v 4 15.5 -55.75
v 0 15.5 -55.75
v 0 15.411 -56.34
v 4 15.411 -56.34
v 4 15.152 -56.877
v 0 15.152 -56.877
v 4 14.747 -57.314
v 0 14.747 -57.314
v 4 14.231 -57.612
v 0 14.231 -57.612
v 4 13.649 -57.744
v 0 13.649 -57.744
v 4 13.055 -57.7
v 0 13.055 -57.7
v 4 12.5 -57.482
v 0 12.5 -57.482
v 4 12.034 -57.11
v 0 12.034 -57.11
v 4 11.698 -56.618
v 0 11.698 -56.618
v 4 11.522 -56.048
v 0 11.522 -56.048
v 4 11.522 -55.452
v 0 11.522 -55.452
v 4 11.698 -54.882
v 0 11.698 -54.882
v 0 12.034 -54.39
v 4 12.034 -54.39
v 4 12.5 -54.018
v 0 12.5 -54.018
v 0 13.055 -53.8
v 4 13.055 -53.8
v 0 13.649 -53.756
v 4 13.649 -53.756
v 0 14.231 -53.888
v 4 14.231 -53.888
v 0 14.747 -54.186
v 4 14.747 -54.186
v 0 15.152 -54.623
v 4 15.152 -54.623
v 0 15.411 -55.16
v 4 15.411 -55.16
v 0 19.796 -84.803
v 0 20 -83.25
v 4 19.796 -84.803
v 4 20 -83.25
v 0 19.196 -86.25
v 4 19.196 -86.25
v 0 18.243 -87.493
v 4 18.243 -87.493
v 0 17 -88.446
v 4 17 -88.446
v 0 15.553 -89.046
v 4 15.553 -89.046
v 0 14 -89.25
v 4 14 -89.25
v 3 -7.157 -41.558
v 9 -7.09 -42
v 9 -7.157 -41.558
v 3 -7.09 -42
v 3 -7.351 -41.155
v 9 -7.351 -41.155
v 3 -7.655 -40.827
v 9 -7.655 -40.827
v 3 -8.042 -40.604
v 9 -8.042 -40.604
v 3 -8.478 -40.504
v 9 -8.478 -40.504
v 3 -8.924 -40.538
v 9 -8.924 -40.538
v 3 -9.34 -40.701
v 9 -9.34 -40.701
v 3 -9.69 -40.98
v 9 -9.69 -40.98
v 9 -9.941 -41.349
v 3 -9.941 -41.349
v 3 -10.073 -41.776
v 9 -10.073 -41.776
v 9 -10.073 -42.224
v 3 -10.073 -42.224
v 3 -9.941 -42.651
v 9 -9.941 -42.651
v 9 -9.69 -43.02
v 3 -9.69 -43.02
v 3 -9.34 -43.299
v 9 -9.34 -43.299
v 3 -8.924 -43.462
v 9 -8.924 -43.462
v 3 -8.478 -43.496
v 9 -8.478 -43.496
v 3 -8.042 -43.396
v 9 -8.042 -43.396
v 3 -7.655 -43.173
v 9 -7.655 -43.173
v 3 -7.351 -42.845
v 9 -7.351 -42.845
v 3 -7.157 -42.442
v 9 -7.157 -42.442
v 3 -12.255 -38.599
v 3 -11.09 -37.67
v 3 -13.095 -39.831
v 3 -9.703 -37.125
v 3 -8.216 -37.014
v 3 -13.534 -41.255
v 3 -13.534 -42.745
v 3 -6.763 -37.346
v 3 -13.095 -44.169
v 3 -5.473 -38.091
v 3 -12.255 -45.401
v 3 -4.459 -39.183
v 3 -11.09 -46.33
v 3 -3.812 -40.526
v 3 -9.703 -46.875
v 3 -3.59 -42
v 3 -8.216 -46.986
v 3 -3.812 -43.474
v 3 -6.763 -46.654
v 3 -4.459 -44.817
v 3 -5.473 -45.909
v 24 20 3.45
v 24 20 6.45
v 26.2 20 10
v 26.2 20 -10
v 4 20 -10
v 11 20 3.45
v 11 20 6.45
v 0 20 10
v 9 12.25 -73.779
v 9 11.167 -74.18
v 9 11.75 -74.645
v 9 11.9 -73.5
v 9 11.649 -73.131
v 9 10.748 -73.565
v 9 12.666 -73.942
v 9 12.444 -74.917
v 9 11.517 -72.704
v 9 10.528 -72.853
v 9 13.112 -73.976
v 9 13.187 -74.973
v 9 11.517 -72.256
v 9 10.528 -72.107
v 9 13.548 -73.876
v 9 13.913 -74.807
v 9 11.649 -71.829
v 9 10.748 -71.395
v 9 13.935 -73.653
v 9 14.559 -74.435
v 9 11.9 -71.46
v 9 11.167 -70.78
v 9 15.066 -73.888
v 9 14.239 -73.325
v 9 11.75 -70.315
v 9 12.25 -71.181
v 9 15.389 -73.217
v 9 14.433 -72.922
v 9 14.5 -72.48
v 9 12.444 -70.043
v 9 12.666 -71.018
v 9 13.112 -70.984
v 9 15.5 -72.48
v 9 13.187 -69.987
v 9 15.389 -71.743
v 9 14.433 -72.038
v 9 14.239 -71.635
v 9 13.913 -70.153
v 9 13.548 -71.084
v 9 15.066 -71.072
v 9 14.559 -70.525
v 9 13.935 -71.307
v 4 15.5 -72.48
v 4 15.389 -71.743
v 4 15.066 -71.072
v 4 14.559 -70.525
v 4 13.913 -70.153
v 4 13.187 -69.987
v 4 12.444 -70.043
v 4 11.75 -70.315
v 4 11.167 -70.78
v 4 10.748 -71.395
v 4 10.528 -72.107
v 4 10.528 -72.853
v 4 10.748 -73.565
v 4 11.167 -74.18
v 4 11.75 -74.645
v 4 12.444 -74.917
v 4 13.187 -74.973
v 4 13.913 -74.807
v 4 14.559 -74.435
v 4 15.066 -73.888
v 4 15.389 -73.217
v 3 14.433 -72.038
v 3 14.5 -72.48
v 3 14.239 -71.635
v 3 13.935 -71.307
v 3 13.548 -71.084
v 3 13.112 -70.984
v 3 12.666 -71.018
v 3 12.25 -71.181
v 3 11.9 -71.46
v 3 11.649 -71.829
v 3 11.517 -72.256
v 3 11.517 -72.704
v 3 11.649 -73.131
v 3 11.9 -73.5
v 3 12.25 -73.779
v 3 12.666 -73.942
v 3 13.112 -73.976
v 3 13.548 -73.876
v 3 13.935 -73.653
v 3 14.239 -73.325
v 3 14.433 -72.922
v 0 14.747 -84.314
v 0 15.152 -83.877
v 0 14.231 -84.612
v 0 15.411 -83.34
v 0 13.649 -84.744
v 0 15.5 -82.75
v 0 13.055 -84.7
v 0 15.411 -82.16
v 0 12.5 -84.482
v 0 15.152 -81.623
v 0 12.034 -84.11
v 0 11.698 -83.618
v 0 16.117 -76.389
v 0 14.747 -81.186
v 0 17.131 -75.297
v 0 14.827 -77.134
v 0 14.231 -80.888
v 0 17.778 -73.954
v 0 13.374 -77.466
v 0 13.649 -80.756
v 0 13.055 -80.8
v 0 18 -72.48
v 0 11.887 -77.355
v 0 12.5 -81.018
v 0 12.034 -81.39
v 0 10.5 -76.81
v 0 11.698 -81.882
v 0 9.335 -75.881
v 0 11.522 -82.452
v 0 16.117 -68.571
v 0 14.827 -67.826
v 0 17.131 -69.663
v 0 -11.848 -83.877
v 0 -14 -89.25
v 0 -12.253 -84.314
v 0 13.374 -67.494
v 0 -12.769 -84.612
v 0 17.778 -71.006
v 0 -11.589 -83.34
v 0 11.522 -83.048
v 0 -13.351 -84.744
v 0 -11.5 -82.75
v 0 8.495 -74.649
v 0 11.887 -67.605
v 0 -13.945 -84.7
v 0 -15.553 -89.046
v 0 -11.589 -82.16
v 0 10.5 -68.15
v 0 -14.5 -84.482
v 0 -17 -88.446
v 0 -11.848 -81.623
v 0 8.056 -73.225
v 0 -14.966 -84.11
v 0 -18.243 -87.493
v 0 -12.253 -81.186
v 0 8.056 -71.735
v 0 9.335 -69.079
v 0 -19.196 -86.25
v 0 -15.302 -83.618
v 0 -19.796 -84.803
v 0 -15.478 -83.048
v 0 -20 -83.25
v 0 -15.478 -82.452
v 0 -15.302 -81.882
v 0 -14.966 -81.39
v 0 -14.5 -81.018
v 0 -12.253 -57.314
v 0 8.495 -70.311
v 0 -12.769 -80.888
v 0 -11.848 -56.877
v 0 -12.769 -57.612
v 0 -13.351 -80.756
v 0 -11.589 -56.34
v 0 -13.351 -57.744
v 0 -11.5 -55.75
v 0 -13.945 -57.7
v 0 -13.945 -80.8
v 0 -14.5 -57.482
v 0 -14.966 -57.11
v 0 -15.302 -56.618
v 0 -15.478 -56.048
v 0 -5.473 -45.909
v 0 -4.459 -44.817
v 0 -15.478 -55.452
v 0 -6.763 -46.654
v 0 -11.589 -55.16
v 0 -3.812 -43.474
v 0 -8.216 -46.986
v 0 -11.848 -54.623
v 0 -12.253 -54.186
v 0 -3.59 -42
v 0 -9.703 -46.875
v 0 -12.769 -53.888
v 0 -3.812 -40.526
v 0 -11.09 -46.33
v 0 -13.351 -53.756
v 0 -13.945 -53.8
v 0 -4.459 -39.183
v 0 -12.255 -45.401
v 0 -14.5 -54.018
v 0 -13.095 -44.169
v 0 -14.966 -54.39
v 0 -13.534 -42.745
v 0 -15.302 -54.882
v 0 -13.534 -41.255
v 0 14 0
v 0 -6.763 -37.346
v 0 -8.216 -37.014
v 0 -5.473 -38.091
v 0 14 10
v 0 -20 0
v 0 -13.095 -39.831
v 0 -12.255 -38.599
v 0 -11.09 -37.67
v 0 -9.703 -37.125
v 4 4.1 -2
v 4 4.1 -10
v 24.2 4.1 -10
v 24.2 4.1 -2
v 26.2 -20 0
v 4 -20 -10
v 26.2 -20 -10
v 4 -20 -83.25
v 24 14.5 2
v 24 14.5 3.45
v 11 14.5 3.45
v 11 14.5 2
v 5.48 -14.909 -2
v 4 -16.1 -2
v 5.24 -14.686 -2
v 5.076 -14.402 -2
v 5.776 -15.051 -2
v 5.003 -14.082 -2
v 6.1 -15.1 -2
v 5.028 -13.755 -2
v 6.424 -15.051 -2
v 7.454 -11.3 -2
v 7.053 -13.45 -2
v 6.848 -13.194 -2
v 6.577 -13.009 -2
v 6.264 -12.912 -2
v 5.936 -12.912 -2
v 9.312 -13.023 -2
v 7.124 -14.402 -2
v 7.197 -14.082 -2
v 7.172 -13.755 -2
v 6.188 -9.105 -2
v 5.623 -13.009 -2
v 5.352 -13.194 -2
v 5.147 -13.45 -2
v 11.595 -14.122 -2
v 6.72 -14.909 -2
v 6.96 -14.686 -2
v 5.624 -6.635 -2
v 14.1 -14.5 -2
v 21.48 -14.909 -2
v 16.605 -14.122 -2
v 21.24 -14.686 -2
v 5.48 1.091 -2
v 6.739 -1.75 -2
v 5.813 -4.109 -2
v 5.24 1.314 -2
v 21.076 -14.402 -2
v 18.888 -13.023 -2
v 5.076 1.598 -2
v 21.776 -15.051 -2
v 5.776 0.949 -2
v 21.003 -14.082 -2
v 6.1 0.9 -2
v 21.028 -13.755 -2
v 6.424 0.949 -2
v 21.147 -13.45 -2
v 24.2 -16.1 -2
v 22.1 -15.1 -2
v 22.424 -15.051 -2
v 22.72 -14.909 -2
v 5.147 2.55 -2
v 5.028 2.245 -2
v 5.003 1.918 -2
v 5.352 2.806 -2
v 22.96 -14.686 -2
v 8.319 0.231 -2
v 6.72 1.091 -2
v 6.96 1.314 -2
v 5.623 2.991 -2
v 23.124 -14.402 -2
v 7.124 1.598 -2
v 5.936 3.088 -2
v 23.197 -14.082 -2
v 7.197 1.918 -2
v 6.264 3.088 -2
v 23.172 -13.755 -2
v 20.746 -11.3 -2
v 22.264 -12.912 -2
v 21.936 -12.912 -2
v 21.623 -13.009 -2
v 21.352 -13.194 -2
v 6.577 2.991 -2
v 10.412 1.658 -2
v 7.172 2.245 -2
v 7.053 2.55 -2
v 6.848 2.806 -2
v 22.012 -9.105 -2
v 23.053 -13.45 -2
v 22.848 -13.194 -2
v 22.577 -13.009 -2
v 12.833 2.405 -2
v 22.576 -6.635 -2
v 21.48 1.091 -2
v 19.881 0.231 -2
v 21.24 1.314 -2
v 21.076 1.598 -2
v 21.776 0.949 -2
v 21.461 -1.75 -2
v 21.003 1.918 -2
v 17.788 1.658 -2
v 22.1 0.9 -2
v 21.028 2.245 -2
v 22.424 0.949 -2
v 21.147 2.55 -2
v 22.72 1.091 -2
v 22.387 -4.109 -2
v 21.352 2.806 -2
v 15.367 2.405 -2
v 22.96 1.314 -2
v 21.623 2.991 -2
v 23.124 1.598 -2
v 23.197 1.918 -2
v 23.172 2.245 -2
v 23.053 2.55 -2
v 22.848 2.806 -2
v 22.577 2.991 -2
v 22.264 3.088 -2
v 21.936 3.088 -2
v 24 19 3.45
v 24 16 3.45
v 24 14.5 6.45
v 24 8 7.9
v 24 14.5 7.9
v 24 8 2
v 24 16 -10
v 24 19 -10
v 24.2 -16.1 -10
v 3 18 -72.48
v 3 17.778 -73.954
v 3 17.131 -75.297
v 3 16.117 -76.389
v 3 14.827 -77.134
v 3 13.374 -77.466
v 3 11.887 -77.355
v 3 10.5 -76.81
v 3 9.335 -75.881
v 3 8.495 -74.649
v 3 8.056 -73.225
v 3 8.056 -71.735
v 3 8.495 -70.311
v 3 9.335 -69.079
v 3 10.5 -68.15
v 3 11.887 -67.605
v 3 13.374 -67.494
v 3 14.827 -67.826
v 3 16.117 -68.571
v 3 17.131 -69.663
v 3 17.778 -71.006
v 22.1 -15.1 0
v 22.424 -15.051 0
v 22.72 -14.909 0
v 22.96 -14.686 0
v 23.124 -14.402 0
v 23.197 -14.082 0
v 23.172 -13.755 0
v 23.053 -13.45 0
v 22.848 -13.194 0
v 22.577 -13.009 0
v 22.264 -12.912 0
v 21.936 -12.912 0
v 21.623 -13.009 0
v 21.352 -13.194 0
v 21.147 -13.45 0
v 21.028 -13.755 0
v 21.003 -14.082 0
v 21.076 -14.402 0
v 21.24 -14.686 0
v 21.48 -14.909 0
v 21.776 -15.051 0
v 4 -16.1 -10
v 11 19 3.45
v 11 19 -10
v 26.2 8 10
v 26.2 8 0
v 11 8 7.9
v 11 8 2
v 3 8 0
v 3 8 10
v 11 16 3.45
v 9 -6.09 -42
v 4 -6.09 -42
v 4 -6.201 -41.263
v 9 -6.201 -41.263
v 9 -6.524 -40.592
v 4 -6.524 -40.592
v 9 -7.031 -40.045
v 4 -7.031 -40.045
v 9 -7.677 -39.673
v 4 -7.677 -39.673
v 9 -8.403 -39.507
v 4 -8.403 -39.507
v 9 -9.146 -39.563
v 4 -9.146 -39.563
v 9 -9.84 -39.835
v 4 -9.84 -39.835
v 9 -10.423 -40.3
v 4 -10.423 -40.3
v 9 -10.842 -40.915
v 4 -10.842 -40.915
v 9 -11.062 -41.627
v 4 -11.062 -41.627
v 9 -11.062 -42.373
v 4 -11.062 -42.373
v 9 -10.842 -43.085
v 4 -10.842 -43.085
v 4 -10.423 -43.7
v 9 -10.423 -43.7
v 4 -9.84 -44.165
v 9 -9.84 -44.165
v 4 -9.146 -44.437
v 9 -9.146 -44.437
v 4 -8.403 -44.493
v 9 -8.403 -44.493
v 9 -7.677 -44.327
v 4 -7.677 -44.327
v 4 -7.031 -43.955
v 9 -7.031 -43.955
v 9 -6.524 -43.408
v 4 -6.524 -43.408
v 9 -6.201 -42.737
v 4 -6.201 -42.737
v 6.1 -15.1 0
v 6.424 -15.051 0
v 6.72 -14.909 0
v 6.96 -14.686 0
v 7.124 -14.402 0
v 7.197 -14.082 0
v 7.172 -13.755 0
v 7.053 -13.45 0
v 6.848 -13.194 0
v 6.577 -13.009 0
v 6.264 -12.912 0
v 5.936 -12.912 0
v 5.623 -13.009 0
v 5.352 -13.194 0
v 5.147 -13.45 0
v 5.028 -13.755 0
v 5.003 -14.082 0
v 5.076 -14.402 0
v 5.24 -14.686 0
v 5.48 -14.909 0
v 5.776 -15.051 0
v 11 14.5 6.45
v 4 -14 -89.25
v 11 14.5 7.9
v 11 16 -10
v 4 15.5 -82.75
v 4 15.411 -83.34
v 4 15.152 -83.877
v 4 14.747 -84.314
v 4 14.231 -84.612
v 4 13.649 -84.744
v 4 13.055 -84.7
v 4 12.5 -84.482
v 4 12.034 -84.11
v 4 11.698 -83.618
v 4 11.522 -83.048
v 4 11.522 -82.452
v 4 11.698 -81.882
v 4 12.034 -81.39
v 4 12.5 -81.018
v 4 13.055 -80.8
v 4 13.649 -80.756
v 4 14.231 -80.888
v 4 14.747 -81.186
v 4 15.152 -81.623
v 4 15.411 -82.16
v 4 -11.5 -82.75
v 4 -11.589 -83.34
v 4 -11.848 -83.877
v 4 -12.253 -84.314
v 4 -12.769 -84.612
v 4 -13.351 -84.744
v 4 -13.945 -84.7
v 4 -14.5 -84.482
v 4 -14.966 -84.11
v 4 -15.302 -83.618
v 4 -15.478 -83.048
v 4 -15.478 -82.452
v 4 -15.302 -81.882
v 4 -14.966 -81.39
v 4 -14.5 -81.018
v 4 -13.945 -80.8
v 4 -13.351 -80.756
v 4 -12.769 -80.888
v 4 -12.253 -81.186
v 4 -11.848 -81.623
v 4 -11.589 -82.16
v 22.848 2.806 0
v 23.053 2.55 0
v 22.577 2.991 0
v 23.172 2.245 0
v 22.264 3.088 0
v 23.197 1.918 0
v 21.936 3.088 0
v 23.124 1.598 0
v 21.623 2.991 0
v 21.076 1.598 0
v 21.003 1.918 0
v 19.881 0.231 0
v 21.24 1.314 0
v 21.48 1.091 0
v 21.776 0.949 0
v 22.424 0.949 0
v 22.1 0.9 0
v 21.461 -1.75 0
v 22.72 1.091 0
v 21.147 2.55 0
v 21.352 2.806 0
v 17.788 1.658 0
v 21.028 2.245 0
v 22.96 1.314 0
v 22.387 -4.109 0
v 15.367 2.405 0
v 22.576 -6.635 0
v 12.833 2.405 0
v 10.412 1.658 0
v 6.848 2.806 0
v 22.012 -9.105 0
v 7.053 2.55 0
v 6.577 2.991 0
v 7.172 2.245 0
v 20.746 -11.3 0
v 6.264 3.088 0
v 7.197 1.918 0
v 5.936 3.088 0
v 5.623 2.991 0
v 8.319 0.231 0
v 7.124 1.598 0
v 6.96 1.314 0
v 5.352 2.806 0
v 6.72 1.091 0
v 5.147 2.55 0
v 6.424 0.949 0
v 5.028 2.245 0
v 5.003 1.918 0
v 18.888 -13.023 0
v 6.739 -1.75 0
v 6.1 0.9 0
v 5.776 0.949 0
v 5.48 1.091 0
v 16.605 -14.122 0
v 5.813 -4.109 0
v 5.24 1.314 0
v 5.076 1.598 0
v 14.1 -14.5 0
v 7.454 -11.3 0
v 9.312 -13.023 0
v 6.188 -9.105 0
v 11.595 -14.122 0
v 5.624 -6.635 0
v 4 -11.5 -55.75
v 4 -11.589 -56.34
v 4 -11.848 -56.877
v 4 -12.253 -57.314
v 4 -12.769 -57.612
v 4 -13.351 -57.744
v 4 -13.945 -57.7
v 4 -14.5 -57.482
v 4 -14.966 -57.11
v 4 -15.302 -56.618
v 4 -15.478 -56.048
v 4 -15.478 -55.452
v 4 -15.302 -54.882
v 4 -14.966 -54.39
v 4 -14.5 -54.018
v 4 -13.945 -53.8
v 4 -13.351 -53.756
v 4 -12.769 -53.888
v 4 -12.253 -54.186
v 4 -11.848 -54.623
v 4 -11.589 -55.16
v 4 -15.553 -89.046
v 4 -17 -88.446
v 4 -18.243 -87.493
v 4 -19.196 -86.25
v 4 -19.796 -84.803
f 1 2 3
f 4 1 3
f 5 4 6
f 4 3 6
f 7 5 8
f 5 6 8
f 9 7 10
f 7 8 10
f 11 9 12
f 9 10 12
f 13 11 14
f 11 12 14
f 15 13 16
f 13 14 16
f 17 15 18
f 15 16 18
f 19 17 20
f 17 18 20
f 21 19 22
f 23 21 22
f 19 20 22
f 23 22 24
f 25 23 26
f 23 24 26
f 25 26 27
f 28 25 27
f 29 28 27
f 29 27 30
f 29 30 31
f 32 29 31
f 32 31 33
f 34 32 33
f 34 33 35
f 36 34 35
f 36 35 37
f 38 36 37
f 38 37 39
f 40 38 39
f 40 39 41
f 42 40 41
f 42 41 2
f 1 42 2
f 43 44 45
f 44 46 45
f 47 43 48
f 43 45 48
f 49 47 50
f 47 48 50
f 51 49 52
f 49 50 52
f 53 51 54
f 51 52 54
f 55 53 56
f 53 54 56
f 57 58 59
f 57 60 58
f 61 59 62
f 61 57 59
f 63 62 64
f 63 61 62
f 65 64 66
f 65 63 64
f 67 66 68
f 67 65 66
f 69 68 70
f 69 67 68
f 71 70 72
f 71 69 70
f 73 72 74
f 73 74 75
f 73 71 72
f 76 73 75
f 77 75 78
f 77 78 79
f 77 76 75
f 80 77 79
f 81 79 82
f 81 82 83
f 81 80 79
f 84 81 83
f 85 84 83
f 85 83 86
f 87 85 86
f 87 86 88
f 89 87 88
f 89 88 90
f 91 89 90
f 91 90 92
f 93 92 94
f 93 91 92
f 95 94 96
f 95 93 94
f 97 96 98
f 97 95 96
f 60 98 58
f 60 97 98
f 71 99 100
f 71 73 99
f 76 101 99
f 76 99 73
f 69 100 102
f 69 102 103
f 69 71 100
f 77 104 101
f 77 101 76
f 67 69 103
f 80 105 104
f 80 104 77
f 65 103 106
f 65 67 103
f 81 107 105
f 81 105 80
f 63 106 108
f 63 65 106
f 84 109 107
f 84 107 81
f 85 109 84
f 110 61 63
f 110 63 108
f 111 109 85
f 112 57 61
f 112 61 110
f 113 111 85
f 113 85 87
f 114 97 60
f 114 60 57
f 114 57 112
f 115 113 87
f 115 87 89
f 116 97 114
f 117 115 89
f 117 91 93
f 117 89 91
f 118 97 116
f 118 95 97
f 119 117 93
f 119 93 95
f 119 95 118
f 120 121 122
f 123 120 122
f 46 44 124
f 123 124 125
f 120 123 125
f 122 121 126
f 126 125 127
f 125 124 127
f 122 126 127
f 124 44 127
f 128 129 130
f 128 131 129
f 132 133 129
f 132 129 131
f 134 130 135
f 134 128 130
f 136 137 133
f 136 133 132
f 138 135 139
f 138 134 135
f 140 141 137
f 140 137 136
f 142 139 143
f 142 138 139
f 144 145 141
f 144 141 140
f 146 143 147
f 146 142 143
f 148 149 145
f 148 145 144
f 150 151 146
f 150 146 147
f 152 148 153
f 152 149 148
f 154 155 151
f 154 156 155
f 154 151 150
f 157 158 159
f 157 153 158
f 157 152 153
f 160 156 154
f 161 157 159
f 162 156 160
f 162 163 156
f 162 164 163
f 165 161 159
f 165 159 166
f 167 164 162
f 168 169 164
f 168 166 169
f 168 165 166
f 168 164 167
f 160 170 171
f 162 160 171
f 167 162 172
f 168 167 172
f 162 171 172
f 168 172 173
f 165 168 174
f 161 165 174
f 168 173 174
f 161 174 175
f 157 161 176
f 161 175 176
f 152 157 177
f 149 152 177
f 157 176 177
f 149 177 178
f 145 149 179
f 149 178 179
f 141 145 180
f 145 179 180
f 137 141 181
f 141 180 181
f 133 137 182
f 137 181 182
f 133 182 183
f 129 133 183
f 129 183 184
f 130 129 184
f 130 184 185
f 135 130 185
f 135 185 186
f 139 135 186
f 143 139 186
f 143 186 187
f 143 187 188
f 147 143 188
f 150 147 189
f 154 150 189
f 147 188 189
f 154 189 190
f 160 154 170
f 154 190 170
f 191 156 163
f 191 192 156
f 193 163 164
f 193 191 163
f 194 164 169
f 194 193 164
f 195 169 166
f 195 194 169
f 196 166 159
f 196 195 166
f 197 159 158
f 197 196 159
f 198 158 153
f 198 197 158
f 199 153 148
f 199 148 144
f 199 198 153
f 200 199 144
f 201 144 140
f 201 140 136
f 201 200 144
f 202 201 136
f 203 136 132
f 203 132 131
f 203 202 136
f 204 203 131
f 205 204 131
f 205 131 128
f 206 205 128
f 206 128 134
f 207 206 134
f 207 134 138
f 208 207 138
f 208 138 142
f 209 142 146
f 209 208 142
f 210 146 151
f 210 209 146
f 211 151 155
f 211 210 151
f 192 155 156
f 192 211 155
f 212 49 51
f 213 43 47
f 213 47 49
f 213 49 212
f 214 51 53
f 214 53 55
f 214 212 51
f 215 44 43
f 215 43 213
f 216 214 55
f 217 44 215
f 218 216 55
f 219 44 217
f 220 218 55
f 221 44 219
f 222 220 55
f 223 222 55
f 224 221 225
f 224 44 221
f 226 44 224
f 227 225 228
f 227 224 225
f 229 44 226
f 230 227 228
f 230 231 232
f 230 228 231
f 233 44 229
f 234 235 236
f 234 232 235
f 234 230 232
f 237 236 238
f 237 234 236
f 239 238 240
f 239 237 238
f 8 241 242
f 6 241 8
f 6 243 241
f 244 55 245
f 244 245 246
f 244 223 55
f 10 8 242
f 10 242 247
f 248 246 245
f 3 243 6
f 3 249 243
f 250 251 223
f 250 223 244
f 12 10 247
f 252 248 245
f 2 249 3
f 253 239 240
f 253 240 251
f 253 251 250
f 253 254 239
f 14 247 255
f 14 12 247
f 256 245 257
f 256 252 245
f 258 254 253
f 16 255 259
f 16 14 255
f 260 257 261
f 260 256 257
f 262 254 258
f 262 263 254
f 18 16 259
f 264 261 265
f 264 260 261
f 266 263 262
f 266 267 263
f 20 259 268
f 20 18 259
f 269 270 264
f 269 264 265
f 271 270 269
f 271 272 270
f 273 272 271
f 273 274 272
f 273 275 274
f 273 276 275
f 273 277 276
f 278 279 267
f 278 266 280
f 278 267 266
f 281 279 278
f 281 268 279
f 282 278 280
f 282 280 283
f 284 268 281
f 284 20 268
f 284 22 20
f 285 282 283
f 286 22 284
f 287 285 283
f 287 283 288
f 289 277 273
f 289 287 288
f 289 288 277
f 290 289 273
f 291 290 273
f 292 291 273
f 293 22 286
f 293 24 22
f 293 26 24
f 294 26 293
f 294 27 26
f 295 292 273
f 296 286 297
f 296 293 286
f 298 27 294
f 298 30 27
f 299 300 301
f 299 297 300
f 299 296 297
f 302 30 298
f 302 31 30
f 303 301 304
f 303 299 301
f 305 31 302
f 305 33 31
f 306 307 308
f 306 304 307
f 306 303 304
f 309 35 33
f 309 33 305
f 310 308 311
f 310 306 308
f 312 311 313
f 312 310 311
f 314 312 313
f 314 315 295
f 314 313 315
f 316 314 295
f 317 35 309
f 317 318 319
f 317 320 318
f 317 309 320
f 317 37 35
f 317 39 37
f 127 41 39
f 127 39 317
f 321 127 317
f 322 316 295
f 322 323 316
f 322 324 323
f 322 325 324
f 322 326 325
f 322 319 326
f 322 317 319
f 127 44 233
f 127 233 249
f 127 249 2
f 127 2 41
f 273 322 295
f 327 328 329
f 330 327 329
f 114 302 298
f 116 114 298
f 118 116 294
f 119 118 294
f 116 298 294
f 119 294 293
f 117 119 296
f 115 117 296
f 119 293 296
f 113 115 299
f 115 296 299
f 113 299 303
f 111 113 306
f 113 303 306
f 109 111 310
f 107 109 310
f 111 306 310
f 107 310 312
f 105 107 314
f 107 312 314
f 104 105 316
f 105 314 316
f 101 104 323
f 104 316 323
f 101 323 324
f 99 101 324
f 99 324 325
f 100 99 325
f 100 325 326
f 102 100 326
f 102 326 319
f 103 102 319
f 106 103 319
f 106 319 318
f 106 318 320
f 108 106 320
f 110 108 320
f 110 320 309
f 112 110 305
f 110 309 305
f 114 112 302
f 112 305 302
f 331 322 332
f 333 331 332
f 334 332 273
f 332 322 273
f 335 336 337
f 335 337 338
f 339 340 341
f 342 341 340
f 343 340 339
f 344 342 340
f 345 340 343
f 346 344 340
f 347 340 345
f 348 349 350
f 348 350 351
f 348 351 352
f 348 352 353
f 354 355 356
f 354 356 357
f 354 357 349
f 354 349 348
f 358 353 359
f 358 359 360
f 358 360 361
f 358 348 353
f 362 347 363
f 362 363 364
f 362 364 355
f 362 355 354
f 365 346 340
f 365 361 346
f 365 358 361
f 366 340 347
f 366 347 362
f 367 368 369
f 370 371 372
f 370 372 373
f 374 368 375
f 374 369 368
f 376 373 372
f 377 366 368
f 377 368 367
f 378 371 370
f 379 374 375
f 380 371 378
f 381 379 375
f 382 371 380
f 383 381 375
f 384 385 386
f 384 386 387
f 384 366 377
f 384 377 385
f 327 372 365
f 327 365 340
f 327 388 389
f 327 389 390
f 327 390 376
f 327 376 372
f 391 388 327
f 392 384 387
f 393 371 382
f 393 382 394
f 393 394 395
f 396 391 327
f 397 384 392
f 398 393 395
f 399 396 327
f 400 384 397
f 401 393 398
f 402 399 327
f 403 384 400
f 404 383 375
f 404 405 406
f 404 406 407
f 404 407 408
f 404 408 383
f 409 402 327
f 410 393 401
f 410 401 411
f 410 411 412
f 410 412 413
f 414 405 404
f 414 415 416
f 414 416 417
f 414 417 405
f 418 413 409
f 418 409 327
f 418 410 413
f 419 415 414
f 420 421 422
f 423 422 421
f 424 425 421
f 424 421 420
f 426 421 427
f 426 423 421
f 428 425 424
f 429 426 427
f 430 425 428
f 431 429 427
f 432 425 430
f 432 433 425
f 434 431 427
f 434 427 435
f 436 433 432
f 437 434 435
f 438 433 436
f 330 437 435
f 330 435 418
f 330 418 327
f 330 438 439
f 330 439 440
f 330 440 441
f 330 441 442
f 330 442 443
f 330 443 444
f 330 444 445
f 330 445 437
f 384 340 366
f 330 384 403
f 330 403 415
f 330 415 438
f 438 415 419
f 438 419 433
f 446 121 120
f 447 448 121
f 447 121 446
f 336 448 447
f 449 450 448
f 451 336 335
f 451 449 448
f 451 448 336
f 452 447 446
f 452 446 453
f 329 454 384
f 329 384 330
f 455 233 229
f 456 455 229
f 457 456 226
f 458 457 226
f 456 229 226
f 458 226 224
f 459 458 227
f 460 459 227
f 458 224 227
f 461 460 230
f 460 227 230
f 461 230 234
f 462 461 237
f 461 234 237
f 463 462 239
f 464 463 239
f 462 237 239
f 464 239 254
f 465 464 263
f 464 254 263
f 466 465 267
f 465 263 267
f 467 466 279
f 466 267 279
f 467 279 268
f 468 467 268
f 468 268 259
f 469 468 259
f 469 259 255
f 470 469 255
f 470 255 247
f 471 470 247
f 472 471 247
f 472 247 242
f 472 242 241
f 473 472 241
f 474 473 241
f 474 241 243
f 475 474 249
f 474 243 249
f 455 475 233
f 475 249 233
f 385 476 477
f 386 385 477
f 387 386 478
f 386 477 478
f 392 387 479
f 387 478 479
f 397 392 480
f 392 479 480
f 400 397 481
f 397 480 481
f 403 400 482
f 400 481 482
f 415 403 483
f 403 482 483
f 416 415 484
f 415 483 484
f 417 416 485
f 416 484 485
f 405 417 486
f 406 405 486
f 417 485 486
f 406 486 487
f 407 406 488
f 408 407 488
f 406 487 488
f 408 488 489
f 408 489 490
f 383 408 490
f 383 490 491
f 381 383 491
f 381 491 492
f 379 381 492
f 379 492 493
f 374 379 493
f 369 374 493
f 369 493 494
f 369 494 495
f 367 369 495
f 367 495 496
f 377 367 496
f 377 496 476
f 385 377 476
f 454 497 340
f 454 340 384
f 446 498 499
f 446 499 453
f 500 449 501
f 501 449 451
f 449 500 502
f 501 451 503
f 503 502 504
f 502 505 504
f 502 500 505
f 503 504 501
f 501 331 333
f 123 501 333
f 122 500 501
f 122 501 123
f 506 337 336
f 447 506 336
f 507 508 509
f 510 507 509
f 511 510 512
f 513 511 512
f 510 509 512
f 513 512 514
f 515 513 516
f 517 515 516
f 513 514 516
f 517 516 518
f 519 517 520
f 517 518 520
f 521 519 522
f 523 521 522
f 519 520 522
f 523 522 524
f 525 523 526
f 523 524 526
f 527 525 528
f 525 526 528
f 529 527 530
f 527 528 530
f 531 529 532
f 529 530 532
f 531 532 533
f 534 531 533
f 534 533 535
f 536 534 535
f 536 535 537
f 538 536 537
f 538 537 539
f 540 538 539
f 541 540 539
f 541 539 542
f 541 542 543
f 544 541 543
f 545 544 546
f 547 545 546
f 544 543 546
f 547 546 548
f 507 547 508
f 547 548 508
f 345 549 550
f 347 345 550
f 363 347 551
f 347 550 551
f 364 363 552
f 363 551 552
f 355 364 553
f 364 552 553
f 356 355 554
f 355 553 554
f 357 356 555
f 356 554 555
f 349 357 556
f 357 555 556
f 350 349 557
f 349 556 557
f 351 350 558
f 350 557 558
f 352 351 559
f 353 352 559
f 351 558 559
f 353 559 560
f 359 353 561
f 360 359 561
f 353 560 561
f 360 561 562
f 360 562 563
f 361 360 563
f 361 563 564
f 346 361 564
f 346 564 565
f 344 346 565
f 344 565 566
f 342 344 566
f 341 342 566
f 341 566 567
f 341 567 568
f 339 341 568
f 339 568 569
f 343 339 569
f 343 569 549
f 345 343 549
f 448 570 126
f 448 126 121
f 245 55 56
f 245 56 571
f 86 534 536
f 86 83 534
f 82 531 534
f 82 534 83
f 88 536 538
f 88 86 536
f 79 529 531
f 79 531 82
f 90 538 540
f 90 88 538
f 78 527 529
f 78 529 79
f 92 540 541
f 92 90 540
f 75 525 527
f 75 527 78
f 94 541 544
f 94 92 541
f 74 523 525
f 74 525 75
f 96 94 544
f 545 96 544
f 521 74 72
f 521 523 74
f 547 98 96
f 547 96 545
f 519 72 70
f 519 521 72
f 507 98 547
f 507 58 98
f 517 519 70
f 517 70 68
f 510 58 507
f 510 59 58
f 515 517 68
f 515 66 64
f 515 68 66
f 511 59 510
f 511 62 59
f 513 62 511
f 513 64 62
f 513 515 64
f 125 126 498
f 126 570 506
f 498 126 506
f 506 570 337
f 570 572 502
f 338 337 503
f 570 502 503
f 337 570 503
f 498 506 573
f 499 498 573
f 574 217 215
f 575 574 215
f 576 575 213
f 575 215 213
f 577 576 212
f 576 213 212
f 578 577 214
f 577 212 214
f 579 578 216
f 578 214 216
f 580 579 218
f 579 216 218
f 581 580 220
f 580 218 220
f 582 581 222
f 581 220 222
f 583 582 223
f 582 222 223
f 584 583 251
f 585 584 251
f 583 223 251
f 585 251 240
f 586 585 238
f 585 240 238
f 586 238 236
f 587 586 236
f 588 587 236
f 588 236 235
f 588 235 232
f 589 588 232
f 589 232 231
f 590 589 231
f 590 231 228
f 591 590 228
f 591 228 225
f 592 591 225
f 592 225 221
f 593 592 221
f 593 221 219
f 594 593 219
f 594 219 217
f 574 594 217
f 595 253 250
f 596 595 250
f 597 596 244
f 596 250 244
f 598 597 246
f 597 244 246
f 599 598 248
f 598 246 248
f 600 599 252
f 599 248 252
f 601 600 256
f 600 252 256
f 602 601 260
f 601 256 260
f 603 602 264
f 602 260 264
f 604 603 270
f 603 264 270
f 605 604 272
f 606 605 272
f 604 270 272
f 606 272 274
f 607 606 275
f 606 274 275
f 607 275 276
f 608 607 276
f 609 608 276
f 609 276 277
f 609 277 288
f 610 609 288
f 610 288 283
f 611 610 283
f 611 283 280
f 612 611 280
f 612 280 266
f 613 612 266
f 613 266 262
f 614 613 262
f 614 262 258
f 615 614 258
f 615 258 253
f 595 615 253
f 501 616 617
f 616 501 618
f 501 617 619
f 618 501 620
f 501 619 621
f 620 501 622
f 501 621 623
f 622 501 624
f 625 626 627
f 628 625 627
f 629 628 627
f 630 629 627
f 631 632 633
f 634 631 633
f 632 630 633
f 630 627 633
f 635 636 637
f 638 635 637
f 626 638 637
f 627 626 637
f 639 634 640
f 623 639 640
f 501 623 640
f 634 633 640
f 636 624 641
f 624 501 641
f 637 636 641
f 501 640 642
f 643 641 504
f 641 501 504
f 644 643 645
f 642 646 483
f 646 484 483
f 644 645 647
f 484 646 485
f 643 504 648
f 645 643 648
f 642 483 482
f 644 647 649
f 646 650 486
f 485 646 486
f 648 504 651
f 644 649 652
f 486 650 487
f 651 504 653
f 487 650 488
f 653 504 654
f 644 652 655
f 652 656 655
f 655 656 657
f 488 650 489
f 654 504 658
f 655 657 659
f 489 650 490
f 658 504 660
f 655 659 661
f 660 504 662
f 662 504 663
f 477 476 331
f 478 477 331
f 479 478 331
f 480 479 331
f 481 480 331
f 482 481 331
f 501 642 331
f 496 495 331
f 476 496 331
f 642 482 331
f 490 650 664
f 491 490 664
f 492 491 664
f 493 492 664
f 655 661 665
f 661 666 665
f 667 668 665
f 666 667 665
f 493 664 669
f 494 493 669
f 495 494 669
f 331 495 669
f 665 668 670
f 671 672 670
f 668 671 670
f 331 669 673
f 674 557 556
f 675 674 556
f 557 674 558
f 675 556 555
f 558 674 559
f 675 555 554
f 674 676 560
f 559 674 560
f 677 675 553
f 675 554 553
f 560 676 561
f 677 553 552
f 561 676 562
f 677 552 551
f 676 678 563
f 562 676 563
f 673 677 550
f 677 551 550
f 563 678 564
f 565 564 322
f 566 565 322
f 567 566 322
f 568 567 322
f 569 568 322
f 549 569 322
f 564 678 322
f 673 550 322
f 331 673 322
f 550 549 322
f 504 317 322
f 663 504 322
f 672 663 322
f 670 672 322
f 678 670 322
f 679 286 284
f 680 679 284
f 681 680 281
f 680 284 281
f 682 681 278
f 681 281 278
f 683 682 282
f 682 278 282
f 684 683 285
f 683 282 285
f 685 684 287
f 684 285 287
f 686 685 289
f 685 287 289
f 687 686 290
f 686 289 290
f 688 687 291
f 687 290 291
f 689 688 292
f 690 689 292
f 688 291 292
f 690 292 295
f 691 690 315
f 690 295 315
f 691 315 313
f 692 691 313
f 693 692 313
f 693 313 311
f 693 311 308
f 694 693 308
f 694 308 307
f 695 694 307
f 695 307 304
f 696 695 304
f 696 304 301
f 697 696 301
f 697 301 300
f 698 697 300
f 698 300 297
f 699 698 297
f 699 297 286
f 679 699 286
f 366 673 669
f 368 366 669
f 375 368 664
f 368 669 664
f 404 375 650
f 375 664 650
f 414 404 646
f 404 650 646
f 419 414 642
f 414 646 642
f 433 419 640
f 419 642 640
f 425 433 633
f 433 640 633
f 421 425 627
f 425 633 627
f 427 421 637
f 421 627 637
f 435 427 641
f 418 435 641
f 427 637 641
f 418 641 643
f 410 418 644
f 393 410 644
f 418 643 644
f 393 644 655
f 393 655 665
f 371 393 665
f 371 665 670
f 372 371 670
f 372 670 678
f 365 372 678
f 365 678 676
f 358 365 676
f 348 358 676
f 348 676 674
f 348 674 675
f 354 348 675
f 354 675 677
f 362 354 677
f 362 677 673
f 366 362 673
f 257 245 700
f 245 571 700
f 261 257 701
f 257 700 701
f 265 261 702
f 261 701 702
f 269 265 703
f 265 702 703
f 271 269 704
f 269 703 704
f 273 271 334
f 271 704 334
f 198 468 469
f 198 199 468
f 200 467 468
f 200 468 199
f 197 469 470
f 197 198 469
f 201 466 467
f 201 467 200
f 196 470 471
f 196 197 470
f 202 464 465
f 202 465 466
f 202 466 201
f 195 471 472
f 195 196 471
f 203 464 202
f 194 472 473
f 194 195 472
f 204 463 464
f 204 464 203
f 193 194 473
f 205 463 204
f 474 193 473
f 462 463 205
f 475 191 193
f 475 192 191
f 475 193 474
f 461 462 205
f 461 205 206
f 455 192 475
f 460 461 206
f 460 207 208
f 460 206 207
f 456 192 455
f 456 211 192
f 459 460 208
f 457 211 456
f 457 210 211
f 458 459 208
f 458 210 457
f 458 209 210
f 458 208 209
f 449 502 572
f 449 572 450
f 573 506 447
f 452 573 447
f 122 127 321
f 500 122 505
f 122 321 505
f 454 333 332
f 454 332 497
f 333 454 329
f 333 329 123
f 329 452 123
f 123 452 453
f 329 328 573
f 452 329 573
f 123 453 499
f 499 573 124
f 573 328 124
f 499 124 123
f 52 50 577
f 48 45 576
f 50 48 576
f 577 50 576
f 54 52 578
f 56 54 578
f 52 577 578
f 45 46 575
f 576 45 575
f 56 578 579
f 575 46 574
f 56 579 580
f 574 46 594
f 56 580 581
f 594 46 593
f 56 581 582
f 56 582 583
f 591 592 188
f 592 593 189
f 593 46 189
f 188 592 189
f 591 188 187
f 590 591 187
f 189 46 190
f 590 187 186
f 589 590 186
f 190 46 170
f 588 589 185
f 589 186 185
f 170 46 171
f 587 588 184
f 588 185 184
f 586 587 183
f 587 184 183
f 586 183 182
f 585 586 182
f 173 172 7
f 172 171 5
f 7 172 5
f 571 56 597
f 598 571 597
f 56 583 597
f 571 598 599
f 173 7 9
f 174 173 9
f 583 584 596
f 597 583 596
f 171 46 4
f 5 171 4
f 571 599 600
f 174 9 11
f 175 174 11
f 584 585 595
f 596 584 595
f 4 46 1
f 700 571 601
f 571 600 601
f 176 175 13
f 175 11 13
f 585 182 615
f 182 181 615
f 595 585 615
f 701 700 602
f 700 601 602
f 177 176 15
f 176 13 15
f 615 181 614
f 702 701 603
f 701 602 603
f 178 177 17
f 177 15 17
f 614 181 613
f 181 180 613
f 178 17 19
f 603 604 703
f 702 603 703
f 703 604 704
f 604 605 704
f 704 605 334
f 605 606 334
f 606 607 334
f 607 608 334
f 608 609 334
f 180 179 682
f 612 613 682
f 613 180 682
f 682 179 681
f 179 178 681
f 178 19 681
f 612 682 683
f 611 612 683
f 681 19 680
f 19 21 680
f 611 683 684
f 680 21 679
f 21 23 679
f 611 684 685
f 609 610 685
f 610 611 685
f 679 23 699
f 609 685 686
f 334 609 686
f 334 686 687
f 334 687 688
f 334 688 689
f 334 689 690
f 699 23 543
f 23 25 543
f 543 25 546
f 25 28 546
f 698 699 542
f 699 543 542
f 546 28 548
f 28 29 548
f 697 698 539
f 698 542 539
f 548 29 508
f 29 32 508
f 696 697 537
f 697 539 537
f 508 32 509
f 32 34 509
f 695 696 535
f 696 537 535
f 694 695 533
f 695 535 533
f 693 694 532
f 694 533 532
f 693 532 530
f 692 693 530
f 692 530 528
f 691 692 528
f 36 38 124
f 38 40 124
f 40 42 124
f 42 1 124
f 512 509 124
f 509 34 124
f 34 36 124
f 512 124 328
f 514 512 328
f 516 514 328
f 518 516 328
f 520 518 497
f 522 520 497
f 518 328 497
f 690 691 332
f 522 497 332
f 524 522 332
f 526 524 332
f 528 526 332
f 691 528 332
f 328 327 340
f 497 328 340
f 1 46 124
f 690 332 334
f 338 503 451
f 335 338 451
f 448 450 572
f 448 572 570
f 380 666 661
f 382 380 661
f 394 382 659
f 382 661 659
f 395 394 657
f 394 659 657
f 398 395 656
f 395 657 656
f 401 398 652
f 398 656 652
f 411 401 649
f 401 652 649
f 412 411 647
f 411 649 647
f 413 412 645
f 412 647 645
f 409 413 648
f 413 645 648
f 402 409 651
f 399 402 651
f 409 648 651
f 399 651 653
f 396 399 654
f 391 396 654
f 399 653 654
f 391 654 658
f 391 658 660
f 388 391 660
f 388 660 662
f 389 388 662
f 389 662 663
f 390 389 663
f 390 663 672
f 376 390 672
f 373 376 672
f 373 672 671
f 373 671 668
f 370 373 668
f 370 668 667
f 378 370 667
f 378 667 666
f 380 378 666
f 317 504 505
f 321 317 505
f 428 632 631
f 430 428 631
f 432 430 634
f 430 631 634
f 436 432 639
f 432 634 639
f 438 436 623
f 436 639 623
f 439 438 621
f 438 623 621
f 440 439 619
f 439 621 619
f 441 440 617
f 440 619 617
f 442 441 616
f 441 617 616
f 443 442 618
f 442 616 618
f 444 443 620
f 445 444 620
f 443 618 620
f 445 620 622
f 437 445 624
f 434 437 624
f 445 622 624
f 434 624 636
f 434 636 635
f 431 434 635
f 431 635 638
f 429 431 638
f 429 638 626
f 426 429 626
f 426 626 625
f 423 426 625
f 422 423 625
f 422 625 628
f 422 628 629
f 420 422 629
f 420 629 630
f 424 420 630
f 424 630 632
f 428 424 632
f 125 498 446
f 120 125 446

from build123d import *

# Parameters (mm, degrees)
PAD008_DEPTH    = 4
PAD009_DEPTH    = 22.2
SKETCH_R        = 2
SKETCH_R_2      = 1.5
POCKET_DEPTH    = 26.201
SKETCH016_W     = 20.2
SKETCH016_H     = 20.2
POCKET001_DEPTH = 8
SKETCH017_R     = 1.1
SKETCH017_R_2   = 8.5
POCKET002_DEPTH = 50
SKETCH018_W     = 5.9
SKETCH018_H     = 13
POCKET003_DEPTH = 6.5
SKETCH019_W     = 3
SKETCH019_H     = 13
POCKET004_DEPTH = 5.501
SKETCH020_W     = 3
SKETCH020_H     = 13
POCKET005_DEPTH = 40
SKETCH021_R     = 5
POCKET006_DEPTH = 3
FILLET_R        = 6
SKETCH022_R     = 2.5
SKETCH022_R_2   = 1.5
PAD_DEPTH       = 5
CHAMFER_SIZE2   = 3
CHAMFER_SIZE    = 6


with BuildPart() as part:
    # Sketch013 → Pad008 (new body)
    with BuildSketch(Plane.YZ):
        Polygon((20, -89.25), (-20, -89.25), (-20, 0), (8, 0), (8, 10), (20, 10), align=None)
    extrude(amount=PAD008_DEPTH)

    # Sketch015 (on Face8 of Pad008) → Pad009 (join)
    with BuildSketch(Plane.YZ.offset(4)):
        Polygon((20, 10), (8, 10), (8, 0), (-20, 0), (-20, -10), (20, -10), align=None)
    extrude(amount=PAD009_DEPTH)

    # Sketch (on Face4 of Pad009) → Pocket (cut, through all)
    with BuildSketch(Plane(origin=(0, 0, 0), x_dir=(0, 1, 0), z_dir=(-1, 0, 0))):
        with Locations((-13.5, 82.75)):
            Circle(SKETCH_R)
        with Locations((13.5, 82.75)):
            Circle(SKETCH_R)
        with Locations((13.5, 55.75)):
            Circle(SKETCH_R)
        with Locations((-13.5, 55.75)):
            Circle(SKETCH_R)
        with Locations((13, 72.48)):
            Circle(SKETCH_R_2)
        with Locations((-8.59, 42)):
            Circle(SKETCH_R_2)
    extrude(amount=-POCKET_DEPTH, mode=Mode.SUBTRACT)

    # Sketch016 (on Face17 of Pocket) → Pocket001 (cut)
    with BuildSketch(Plane.YX.offset(10)):
        with Locations((-6, 14.1)):
            Rectangle(SKETCH016_W, SKETCH016_H)
    extrude(amount=-POCKET001_DEPTH, mode=Mode.SUBTRACT)

    # Sketch017 (on Face19 of Pocket001) → Pocket002 (cut)
    with BuildSketch(Plane(origin=(0, 0, 10), x_dir=(0, -1, 0), z_dir=(0, 0, 1))):
        with Locations((-2, 6.1)):
            Circle(SKETCH017_R)
        with Locations((14, 6.1)):
            Circle(SKETCH017_R)
        with Locations((14, 22.1)):
            Circle(SKETCH017_R)
        with Locations((-2, 22.1)):
            Circle(SKETCH017_R)
        with Locations((6, 14.1)):
            Circle(SKETCH017_R_2)
    extrude(amount=-POCKET002_DEPTH, mode=Mode.SUBTRACT)

    # Sketch018 (on Face22 of Pocket002) → Pocket003 (cut)
    with BuildSketch(Plane(origin=(0, 8, 0), x_dir=(0, 0, -1), z_dir=(0, -1, 0))):
        with Locations((-4.95, 17.5)):
            Rectangle(SKETCH018_W, SKETCH018_H)
    extrude(amount=-POCKET003_DEPTH, mode=Mode.SUBTRACT)

    # Sketch019 (on Face36 of Pocket003) → Pocket004 (cut, through all)
    with BuildSketch(Plane(origin=(0, 14.5, 0), x_dir=(0, 0, -1), z_dir=(0, -1, 0))):
        with Locations((-4.95, 17.5)):
            Rectangle(SKETCH019_W, SKETCH019_H)
    extrude(amount=-POCKET004_DEPTH, mode=Mode.SUBTRACT)

    # Sketch020 (on Face23 of Pocket004) → Pocket005 (cut)
    with BuildSketch(Plane(origin=(0, 0, 3.45), x_dir=(0, -1, 0), z_dir=(0, 0, 1))):
        with Locations((-17.5, 17.5)):
            Rectangle(SKETCH020_W, SKETCH020_H)
    extrude(amount=-POCKET005_DEPTH, mode=Mode.SUBTRACT)

    # Sketch021 (on Face4 of Pocket005) → Pocket006 (cut)
    with BuildSketch(Plane(origin=(0, 0, 0), x_dir=(0, 1, 0), z_dir=(-1, 0, 0))):
        with Locations((-8.59, 42)):
            Circle(SKETCH021_R)
        with Locations((13, 72.48)):
            Circle(SKETCH021_R)
    extrude(amount=-POCKET006_DEPTH, mode=Mode.SUBTRACT)

    # Fillet
    fillet_edges = [part.edges().sort_by_distance(p)[0] for p in [
        (2, -20, -89.25),
        (2, 20, -89.25),
    ]]
    fillet(fillet_edges, radius=FILLET_R)

    # Sketch022 → Pad (join)
    with BuildSketch(Plane.YZ.offset(4)):
        with Locations((-8.59, -42)):
            Circle(SKETCH022_R)
        with Locations((-8.59, -42)):
            Circle(SKETCH022_R_2, mode=Mode.SUBTRACT)
        with Locations((13, -72.48)):
            Circle(SKETCH022_R)
        with Locations((13, -72.48)):
            Circle(SKETCH022_R_2, mode=Mode.SUBTRACT)
    extrude(amount=PAD_DEPTH)

    # Chamfer
    chamfer_edges = [part.edges().sort_by_distance(p)[0] for p in [
        (0, 8, 5),
    ]]
    chamfer_side = part.faces().sort_by_distance((0, 0.384644, -41.786068))[0]
    chamfer(chamfer_edges, length=CHAMFER_SIZE, length2=CHAMFER_SIZE2, reference=chamfer_side)


solid = part.part
